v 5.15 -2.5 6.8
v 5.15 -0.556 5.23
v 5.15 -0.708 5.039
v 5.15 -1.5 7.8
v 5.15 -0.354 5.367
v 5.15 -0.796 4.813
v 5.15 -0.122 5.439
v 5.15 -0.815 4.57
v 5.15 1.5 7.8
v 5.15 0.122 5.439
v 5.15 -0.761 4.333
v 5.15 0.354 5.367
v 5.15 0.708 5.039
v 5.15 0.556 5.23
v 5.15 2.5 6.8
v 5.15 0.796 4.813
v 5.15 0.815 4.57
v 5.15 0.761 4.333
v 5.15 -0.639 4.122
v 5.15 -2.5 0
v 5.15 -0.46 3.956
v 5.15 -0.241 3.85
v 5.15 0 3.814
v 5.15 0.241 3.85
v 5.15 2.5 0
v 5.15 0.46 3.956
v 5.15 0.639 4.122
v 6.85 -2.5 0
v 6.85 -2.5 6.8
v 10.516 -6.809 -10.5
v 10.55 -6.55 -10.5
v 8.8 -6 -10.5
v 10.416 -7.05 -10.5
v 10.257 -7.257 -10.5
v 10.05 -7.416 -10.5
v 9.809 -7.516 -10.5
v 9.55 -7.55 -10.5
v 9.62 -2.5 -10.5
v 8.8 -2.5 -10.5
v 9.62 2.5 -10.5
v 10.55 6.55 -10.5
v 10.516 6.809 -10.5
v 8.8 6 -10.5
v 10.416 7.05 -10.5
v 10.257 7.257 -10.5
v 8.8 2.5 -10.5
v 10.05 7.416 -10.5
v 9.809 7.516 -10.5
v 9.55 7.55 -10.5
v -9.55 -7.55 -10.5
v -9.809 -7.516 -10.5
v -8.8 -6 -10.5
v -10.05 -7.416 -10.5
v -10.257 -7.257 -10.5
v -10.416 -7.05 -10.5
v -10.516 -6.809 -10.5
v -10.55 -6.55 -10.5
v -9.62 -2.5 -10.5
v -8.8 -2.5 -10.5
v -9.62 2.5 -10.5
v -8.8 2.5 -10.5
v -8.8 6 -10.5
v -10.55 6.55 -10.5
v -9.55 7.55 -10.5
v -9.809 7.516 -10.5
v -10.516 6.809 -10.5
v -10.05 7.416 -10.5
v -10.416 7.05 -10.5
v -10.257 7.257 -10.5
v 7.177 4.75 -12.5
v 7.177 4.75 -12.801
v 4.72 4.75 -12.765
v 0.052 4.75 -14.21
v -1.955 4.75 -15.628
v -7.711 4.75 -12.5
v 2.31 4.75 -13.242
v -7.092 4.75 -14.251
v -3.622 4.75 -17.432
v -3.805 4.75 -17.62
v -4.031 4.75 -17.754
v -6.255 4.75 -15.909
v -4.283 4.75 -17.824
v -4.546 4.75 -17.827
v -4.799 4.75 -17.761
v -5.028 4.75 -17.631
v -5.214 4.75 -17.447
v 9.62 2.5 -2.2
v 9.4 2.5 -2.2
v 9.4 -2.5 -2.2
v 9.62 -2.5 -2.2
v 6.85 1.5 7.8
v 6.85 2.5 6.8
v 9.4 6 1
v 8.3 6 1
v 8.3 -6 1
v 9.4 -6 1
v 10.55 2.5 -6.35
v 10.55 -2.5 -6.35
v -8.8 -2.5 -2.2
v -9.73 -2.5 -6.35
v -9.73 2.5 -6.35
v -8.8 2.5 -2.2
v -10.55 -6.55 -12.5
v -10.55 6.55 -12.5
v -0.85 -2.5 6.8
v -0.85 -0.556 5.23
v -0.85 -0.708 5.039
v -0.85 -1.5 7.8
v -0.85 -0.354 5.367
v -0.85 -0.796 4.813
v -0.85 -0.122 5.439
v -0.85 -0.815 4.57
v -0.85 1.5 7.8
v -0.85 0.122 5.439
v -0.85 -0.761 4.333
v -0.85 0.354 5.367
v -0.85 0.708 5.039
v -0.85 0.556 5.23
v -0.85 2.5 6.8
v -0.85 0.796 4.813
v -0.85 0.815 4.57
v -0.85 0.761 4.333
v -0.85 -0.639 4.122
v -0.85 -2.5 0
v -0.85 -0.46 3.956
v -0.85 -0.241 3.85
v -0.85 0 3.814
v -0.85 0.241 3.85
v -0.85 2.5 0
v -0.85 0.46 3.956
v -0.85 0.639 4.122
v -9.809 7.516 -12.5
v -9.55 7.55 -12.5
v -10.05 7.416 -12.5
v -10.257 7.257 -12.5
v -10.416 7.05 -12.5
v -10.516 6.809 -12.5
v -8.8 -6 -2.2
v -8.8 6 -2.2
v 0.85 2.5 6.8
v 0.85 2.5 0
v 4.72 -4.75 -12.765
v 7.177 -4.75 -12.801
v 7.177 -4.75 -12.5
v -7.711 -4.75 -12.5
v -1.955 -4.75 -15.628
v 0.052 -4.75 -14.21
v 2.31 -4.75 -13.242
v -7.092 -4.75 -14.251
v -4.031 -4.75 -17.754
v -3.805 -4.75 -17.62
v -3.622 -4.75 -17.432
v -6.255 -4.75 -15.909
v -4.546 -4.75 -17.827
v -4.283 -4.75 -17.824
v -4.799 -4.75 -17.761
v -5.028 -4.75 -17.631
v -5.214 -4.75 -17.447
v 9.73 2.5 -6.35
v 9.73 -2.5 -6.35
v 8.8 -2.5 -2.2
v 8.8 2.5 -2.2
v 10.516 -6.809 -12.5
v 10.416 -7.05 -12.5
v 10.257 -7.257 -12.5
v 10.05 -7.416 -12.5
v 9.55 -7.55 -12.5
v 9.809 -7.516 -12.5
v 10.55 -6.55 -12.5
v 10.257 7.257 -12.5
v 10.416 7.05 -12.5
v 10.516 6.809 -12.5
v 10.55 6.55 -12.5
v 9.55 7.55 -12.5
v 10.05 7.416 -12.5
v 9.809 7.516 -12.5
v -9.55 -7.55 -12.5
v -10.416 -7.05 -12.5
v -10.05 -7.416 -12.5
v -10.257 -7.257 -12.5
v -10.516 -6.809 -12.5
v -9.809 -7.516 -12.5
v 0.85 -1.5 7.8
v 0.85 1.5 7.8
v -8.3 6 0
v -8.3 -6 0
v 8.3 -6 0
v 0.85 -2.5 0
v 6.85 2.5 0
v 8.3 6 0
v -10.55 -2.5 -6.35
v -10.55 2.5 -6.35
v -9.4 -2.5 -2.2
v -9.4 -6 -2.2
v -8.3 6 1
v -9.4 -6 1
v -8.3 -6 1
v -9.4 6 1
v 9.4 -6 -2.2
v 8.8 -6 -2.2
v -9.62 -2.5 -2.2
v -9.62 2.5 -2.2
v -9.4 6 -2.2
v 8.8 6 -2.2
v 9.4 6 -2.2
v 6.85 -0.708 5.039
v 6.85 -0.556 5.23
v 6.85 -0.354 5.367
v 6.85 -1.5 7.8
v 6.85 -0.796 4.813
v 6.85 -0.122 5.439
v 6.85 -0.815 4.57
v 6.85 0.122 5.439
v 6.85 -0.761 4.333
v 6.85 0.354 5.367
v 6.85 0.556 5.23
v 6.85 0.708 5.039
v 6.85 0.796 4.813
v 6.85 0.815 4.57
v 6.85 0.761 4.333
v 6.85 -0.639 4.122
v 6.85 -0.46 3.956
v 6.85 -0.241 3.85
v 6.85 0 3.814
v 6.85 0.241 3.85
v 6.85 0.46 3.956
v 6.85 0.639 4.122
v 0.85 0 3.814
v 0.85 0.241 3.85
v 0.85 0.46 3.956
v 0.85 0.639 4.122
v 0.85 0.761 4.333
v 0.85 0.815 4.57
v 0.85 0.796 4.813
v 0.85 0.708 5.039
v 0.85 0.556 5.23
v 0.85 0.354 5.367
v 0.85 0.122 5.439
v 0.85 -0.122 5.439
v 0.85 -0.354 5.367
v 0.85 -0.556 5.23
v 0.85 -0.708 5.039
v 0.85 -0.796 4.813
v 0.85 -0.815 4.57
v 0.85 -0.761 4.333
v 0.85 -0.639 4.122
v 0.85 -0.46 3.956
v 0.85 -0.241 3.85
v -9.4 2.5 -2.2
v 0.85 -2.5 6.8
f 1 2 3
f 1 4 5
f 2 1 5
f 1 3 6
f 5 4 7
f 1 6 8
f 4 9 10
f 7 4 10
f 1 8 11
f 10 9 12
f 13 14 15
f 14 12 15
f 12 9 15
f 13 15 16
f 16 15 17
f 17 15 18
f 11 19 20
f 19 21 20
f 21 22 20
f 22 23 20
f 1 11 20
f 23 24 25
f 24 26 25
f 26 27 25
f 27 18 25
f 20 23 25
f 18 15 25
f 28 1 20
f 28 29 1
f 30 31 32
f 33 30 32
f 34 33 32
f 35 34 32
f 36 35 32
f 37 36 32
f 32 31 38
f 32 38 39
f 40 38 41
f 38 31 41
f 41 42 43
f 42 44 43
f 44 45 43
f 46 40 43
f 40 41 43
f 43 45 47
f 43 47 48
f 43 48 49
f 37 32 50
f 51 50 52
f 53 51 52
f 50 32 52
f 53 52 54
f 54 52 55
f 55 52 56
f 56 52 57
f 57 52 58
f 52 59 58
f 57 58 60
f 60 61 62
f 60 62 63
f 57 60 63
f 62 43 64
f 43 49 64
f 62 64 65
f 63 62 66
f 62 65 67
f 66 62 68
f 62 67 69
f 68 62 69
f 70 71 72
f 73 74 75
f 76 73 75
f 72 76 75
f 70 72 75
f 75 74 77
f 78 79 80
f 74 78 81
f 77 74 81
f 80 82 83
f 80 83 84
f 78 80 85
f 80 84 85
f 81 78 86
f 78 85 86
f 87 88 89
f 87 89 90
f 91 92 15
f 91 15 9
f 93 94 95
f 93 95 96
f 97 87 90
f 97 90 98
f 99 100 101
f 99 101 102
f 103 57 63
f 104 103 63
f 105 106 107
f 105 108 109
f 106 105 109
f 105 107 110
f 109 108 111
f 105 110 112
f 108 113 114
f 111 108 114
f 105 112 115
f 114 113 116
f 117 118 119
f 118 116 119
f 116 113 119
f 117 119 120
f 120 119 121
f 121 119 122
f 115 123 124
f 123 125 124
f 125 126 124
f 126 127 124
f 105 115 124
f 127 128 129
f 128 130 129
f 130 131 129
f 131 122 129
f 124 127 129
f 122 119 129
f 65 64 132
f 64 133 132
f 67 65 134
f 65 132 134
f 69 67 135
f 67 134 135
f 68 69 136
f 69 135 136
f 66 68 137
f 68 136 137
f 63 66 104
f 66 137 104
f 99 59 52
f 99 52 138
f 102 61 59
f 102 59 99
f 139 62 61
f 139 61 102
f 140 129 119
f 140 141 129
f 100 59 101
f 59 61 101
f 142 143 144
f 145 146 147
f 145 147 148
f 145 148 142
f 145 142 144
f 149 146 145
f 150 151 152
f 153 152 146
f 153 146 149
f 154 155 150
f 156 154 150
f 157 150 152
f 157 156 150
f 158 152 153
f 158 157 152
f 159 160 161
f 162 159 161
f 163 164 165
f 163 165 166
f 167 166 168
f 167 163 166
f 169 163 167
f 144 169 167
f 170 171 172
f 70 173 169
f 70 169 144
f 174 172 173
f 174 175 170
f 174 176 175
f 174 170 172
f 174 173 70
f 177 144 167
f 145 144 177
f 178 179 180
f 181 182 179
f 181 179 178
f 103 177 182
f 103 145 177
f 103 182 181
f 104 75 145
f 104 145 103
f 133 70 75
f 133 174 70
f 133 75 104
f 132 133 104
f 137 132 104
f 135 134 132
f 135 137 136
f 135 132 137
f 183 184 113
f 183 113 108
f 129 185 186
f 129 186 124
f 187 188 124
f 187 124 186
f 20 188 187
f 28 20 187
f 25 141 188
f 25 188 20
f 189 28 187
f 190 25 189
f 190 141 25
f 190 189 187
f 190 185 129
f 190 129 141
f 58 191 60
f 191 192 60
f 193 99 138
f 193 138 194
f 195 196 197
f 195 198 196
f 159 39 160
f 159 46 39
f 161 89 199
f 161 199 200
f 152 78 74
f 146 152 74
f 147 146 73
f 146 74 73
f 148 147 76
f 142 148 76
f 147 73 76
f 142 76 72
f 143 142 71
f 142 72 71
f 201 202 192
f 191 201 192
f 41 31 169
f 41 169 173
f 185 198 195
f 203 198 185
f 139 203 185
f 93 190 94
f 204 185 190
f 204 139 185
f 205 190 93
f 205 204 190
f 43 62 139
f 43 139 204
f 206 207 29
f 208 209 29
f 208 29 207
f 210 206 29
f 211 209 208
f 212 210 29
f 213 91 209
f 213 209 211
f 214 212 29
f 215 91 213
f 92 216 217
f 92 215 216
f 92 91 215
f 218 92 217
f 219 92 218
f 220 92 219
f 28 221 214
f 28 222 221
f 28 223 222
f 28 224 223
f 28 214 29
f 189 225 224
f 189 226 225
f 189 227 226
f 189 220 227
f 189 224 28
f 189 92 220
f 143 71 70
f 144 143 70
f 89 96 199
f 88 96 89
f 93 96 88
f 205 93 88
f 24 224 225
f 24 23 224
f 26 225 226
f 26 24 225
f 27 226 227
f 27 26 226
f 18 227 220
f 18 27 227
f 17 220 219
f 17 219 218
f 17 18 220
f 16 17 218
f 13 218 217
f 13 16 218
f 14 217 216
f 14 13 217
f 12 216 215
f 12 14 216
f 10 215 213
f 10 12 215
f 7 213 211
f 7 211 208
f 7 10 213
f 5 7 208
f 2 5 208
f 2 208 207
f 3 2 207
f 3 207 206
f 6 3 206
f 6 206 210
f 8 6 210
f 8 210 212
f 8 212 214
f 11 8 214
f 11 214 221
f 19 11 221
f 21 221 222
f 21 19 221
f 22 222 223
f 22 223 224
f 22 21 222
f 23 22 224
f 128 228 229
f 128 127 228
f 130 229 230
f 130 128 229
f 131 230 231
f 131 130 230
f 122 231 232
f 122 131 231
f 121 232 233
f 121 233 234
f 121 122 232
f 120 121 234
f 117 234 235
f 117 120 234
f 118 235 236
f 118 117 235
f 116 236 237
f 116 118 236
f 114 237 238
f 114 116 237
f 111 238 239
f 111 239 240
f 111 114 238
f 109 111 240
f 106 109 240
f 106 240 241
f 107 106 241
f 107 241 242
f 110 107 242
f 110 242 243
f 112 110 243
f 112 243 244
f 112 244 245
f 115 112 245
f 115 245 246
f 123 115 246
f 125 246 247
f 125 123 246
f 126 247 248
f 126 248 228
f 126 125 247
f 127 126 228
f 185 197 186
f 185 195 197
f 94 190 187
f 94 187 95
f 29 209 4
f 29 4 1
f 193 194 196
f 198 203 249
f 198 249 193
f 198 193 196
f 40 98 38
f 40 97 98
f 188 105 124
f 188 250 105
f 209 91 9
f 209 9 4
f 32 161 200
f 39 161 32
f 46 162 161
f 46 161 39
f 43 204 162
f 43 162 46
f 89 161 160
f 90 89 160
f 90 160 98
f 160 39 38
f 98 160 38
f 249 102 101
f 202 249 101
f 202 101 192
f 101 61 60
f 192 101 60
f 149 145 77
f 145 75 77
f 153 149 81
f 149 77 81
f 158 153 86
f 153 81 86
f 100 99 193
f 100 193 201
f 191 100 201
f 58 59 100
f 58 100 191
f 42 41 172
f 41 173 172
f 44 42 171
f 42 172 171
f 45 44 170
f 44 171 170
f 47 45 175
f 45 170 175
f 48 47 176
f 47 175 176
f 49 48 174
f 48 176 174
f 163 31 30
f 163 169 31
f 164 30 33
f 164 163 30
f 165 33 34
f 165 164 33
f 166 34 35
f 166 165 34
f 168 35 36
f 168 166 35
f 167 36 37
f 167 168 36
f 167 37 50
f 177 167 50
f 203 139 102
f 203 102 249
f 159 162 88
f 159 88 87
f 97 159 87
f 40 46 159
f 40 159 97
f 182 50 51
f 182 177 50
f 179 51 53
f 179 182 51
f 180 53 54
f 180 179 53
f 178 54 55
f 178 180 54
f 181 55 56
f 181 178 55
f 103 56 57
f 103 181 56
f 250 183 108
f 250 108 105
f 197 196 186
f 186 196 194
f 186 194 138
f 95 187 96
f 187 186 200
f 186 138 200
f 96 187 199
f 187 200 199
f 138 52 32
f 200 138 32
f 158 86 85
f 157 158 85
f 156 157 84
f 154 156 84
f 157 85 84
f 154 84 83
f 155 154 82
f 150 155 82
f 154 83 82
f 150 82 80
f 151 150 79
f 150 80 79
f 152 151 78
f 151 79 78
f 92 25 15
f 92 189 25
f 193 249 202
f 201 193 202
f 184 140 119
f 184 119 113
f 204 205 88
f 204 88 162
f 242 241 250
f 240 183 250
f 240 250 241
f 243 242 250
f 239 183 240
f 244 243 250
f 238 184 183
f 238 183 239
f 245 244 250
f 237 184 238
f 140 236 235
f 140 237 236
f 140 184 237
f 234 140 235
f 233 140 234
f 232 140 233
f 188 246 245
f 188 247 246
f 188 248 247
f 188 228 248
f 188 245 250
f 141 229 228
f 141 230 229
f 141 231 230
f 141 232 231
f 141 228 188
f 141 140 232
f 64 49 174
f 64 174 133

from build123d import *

# Parameters (mm, degrees)
BOSS_EXTRUDE1_DEPTH = 6
SKETCH2_W           = 21.1
SKETCH2_H           = 15.1
BOSS_EXTRUDE2_DEPTH = 2
FILLET1_R           = 1
SKETCH3_R           = 0.816975511
BOSS_EXTRUDE3_DEPTH = 0.85
LPATTERN1_COUNT     = 2
LPATTERN1_PITCH     = 6
BOSS_EXTRUDE4_DEPTH = 4.75
BOSS_EXTRUDE5_DEPTH = 2.5


with BuildPart() as part:
    # Sketch1 → Boss-Extrude1 (new, symmetric)
    with BuildSketch(Plane(origin=(0, 0, 0), x_dir=(1, 0, 0), z_dir=(0, 1, 0))):
        Polygon((-8.3, 0), (8.3, 0), (8.3, -1), (9.4, -1), (9.4, 2.2), (8.8, 2.2), (8.8, 10.5), (-8.8, 10.5), (-8.8, 2.2), (-9.4, 2.2), (-9.4, -1), (-8.3, -1), align=None)
    extrude(amount=BOSS_EXTRUDE1_DEPTH, both=True)

    # Sketch2 → Boss-Extrude2 (add)
    with BuildSketch(Plane(origin=(0, 0, -10.5), x_dir=(-1, 0, 0), z_dir=(0, 0, -1))):
        Rectangle(SKETCH2_W, SKETCH2_H)
    extrude(amount=BOSS_EXTRUDE2_DEPTH)

    # Fillet1
    fillet1_edges = [part.edges().sort_by_distance(p)[0] for p in [
        (10.55, 7.55, -11.5),
        (10.55, -7.55, -11.5),
        (-10.55, -7.55, -11.5),
        (-10.55, 7.55, -11.5),
    ]]
    fillet(fillet1_edges, radius=FILLET1_R)

    # Sketch3 → Boss-Extrude3 (add, symmetric)
    with BuildSketch(Plane(origin=(0, 0, 0), x_dir=(0, 0, -1), z_dir=(1, 0, 0))):
        Polygon((0, 2.5), (-6.8, 2.5), (-7.8, 1.5), (-7.8, -1.5), (-6.8, -2.5), (0, -2.5), align=None)
        with Locations((-4.630991461, 0)):
            Circle(SKETCH3_R, mode=Mode.SUBTRACT)
    boss_extrude3 = extrude(amount=BOSS_EXTRUDE3_DEPTH, both=True)

    # LPattern1: Boss-Extrude3 ×2
    with Locations(*[(i * LPATTERN1_PITCH, 0, 0) for i in range(1, LPATTERN1_COUNT)]):
        add(boss_extrude3)

    # Sketch4 → Boss-Extrude4 (add, symmetric)
    with BuildSketch(Plane(origin=(0, 0, 0), x_dir=(1, 0, 0), z_dir=(0, 1, 0))):
        with BuildLine():
            Line((7.176954922, 12.800602649), (7.176954922, 12.5))
            Line((7.176954922, 12.5), (-7.71090433, 12.5))
            ThreePointArc((-7.71090433, 12.5), (-6.700290902, 15.093362546), (-5.21395506, 17.446588959))
            ThreePointArc((-5.21395506, 17.446588959), (-4.414402061, 17.834047388), (-3.622018998, 17.432129346))
            ThreePointArc((-3.622018998, 17.432129346), (1.155737297, 13.666724512), (7.176954922, 12.800602649))
        make_face()
    extrude(amount=BOSS_EXTRUDE4_DEPTH, both=True)

    # Sketch5 → Boss-Extrude5 (add, symmetric)
    with BuildSketch(Plane(origin=(0, 0, 0), x_dir=(1, 0, 0), z_dir=(0, 1, 0))):
        Polygon((8.8, 10.5), (9.730151973, 6.35), (8.8, 2.2), (9.619848027, 2.2), (10.55, 6.35), (9.619848027, 10.5), align=None)
    boss_extrude5 = extrude(amount=BOSS_EXTRUDE5_DEPTH, both=True)

    # Mirror1: Boss-Extrude5 across plane
    add(boss_extrude5.mirror(Plane(origin=(0, 0, 0), x_dir=(0, 0, 1), z_dir=(1, 0, 0))))


solid = part.part
